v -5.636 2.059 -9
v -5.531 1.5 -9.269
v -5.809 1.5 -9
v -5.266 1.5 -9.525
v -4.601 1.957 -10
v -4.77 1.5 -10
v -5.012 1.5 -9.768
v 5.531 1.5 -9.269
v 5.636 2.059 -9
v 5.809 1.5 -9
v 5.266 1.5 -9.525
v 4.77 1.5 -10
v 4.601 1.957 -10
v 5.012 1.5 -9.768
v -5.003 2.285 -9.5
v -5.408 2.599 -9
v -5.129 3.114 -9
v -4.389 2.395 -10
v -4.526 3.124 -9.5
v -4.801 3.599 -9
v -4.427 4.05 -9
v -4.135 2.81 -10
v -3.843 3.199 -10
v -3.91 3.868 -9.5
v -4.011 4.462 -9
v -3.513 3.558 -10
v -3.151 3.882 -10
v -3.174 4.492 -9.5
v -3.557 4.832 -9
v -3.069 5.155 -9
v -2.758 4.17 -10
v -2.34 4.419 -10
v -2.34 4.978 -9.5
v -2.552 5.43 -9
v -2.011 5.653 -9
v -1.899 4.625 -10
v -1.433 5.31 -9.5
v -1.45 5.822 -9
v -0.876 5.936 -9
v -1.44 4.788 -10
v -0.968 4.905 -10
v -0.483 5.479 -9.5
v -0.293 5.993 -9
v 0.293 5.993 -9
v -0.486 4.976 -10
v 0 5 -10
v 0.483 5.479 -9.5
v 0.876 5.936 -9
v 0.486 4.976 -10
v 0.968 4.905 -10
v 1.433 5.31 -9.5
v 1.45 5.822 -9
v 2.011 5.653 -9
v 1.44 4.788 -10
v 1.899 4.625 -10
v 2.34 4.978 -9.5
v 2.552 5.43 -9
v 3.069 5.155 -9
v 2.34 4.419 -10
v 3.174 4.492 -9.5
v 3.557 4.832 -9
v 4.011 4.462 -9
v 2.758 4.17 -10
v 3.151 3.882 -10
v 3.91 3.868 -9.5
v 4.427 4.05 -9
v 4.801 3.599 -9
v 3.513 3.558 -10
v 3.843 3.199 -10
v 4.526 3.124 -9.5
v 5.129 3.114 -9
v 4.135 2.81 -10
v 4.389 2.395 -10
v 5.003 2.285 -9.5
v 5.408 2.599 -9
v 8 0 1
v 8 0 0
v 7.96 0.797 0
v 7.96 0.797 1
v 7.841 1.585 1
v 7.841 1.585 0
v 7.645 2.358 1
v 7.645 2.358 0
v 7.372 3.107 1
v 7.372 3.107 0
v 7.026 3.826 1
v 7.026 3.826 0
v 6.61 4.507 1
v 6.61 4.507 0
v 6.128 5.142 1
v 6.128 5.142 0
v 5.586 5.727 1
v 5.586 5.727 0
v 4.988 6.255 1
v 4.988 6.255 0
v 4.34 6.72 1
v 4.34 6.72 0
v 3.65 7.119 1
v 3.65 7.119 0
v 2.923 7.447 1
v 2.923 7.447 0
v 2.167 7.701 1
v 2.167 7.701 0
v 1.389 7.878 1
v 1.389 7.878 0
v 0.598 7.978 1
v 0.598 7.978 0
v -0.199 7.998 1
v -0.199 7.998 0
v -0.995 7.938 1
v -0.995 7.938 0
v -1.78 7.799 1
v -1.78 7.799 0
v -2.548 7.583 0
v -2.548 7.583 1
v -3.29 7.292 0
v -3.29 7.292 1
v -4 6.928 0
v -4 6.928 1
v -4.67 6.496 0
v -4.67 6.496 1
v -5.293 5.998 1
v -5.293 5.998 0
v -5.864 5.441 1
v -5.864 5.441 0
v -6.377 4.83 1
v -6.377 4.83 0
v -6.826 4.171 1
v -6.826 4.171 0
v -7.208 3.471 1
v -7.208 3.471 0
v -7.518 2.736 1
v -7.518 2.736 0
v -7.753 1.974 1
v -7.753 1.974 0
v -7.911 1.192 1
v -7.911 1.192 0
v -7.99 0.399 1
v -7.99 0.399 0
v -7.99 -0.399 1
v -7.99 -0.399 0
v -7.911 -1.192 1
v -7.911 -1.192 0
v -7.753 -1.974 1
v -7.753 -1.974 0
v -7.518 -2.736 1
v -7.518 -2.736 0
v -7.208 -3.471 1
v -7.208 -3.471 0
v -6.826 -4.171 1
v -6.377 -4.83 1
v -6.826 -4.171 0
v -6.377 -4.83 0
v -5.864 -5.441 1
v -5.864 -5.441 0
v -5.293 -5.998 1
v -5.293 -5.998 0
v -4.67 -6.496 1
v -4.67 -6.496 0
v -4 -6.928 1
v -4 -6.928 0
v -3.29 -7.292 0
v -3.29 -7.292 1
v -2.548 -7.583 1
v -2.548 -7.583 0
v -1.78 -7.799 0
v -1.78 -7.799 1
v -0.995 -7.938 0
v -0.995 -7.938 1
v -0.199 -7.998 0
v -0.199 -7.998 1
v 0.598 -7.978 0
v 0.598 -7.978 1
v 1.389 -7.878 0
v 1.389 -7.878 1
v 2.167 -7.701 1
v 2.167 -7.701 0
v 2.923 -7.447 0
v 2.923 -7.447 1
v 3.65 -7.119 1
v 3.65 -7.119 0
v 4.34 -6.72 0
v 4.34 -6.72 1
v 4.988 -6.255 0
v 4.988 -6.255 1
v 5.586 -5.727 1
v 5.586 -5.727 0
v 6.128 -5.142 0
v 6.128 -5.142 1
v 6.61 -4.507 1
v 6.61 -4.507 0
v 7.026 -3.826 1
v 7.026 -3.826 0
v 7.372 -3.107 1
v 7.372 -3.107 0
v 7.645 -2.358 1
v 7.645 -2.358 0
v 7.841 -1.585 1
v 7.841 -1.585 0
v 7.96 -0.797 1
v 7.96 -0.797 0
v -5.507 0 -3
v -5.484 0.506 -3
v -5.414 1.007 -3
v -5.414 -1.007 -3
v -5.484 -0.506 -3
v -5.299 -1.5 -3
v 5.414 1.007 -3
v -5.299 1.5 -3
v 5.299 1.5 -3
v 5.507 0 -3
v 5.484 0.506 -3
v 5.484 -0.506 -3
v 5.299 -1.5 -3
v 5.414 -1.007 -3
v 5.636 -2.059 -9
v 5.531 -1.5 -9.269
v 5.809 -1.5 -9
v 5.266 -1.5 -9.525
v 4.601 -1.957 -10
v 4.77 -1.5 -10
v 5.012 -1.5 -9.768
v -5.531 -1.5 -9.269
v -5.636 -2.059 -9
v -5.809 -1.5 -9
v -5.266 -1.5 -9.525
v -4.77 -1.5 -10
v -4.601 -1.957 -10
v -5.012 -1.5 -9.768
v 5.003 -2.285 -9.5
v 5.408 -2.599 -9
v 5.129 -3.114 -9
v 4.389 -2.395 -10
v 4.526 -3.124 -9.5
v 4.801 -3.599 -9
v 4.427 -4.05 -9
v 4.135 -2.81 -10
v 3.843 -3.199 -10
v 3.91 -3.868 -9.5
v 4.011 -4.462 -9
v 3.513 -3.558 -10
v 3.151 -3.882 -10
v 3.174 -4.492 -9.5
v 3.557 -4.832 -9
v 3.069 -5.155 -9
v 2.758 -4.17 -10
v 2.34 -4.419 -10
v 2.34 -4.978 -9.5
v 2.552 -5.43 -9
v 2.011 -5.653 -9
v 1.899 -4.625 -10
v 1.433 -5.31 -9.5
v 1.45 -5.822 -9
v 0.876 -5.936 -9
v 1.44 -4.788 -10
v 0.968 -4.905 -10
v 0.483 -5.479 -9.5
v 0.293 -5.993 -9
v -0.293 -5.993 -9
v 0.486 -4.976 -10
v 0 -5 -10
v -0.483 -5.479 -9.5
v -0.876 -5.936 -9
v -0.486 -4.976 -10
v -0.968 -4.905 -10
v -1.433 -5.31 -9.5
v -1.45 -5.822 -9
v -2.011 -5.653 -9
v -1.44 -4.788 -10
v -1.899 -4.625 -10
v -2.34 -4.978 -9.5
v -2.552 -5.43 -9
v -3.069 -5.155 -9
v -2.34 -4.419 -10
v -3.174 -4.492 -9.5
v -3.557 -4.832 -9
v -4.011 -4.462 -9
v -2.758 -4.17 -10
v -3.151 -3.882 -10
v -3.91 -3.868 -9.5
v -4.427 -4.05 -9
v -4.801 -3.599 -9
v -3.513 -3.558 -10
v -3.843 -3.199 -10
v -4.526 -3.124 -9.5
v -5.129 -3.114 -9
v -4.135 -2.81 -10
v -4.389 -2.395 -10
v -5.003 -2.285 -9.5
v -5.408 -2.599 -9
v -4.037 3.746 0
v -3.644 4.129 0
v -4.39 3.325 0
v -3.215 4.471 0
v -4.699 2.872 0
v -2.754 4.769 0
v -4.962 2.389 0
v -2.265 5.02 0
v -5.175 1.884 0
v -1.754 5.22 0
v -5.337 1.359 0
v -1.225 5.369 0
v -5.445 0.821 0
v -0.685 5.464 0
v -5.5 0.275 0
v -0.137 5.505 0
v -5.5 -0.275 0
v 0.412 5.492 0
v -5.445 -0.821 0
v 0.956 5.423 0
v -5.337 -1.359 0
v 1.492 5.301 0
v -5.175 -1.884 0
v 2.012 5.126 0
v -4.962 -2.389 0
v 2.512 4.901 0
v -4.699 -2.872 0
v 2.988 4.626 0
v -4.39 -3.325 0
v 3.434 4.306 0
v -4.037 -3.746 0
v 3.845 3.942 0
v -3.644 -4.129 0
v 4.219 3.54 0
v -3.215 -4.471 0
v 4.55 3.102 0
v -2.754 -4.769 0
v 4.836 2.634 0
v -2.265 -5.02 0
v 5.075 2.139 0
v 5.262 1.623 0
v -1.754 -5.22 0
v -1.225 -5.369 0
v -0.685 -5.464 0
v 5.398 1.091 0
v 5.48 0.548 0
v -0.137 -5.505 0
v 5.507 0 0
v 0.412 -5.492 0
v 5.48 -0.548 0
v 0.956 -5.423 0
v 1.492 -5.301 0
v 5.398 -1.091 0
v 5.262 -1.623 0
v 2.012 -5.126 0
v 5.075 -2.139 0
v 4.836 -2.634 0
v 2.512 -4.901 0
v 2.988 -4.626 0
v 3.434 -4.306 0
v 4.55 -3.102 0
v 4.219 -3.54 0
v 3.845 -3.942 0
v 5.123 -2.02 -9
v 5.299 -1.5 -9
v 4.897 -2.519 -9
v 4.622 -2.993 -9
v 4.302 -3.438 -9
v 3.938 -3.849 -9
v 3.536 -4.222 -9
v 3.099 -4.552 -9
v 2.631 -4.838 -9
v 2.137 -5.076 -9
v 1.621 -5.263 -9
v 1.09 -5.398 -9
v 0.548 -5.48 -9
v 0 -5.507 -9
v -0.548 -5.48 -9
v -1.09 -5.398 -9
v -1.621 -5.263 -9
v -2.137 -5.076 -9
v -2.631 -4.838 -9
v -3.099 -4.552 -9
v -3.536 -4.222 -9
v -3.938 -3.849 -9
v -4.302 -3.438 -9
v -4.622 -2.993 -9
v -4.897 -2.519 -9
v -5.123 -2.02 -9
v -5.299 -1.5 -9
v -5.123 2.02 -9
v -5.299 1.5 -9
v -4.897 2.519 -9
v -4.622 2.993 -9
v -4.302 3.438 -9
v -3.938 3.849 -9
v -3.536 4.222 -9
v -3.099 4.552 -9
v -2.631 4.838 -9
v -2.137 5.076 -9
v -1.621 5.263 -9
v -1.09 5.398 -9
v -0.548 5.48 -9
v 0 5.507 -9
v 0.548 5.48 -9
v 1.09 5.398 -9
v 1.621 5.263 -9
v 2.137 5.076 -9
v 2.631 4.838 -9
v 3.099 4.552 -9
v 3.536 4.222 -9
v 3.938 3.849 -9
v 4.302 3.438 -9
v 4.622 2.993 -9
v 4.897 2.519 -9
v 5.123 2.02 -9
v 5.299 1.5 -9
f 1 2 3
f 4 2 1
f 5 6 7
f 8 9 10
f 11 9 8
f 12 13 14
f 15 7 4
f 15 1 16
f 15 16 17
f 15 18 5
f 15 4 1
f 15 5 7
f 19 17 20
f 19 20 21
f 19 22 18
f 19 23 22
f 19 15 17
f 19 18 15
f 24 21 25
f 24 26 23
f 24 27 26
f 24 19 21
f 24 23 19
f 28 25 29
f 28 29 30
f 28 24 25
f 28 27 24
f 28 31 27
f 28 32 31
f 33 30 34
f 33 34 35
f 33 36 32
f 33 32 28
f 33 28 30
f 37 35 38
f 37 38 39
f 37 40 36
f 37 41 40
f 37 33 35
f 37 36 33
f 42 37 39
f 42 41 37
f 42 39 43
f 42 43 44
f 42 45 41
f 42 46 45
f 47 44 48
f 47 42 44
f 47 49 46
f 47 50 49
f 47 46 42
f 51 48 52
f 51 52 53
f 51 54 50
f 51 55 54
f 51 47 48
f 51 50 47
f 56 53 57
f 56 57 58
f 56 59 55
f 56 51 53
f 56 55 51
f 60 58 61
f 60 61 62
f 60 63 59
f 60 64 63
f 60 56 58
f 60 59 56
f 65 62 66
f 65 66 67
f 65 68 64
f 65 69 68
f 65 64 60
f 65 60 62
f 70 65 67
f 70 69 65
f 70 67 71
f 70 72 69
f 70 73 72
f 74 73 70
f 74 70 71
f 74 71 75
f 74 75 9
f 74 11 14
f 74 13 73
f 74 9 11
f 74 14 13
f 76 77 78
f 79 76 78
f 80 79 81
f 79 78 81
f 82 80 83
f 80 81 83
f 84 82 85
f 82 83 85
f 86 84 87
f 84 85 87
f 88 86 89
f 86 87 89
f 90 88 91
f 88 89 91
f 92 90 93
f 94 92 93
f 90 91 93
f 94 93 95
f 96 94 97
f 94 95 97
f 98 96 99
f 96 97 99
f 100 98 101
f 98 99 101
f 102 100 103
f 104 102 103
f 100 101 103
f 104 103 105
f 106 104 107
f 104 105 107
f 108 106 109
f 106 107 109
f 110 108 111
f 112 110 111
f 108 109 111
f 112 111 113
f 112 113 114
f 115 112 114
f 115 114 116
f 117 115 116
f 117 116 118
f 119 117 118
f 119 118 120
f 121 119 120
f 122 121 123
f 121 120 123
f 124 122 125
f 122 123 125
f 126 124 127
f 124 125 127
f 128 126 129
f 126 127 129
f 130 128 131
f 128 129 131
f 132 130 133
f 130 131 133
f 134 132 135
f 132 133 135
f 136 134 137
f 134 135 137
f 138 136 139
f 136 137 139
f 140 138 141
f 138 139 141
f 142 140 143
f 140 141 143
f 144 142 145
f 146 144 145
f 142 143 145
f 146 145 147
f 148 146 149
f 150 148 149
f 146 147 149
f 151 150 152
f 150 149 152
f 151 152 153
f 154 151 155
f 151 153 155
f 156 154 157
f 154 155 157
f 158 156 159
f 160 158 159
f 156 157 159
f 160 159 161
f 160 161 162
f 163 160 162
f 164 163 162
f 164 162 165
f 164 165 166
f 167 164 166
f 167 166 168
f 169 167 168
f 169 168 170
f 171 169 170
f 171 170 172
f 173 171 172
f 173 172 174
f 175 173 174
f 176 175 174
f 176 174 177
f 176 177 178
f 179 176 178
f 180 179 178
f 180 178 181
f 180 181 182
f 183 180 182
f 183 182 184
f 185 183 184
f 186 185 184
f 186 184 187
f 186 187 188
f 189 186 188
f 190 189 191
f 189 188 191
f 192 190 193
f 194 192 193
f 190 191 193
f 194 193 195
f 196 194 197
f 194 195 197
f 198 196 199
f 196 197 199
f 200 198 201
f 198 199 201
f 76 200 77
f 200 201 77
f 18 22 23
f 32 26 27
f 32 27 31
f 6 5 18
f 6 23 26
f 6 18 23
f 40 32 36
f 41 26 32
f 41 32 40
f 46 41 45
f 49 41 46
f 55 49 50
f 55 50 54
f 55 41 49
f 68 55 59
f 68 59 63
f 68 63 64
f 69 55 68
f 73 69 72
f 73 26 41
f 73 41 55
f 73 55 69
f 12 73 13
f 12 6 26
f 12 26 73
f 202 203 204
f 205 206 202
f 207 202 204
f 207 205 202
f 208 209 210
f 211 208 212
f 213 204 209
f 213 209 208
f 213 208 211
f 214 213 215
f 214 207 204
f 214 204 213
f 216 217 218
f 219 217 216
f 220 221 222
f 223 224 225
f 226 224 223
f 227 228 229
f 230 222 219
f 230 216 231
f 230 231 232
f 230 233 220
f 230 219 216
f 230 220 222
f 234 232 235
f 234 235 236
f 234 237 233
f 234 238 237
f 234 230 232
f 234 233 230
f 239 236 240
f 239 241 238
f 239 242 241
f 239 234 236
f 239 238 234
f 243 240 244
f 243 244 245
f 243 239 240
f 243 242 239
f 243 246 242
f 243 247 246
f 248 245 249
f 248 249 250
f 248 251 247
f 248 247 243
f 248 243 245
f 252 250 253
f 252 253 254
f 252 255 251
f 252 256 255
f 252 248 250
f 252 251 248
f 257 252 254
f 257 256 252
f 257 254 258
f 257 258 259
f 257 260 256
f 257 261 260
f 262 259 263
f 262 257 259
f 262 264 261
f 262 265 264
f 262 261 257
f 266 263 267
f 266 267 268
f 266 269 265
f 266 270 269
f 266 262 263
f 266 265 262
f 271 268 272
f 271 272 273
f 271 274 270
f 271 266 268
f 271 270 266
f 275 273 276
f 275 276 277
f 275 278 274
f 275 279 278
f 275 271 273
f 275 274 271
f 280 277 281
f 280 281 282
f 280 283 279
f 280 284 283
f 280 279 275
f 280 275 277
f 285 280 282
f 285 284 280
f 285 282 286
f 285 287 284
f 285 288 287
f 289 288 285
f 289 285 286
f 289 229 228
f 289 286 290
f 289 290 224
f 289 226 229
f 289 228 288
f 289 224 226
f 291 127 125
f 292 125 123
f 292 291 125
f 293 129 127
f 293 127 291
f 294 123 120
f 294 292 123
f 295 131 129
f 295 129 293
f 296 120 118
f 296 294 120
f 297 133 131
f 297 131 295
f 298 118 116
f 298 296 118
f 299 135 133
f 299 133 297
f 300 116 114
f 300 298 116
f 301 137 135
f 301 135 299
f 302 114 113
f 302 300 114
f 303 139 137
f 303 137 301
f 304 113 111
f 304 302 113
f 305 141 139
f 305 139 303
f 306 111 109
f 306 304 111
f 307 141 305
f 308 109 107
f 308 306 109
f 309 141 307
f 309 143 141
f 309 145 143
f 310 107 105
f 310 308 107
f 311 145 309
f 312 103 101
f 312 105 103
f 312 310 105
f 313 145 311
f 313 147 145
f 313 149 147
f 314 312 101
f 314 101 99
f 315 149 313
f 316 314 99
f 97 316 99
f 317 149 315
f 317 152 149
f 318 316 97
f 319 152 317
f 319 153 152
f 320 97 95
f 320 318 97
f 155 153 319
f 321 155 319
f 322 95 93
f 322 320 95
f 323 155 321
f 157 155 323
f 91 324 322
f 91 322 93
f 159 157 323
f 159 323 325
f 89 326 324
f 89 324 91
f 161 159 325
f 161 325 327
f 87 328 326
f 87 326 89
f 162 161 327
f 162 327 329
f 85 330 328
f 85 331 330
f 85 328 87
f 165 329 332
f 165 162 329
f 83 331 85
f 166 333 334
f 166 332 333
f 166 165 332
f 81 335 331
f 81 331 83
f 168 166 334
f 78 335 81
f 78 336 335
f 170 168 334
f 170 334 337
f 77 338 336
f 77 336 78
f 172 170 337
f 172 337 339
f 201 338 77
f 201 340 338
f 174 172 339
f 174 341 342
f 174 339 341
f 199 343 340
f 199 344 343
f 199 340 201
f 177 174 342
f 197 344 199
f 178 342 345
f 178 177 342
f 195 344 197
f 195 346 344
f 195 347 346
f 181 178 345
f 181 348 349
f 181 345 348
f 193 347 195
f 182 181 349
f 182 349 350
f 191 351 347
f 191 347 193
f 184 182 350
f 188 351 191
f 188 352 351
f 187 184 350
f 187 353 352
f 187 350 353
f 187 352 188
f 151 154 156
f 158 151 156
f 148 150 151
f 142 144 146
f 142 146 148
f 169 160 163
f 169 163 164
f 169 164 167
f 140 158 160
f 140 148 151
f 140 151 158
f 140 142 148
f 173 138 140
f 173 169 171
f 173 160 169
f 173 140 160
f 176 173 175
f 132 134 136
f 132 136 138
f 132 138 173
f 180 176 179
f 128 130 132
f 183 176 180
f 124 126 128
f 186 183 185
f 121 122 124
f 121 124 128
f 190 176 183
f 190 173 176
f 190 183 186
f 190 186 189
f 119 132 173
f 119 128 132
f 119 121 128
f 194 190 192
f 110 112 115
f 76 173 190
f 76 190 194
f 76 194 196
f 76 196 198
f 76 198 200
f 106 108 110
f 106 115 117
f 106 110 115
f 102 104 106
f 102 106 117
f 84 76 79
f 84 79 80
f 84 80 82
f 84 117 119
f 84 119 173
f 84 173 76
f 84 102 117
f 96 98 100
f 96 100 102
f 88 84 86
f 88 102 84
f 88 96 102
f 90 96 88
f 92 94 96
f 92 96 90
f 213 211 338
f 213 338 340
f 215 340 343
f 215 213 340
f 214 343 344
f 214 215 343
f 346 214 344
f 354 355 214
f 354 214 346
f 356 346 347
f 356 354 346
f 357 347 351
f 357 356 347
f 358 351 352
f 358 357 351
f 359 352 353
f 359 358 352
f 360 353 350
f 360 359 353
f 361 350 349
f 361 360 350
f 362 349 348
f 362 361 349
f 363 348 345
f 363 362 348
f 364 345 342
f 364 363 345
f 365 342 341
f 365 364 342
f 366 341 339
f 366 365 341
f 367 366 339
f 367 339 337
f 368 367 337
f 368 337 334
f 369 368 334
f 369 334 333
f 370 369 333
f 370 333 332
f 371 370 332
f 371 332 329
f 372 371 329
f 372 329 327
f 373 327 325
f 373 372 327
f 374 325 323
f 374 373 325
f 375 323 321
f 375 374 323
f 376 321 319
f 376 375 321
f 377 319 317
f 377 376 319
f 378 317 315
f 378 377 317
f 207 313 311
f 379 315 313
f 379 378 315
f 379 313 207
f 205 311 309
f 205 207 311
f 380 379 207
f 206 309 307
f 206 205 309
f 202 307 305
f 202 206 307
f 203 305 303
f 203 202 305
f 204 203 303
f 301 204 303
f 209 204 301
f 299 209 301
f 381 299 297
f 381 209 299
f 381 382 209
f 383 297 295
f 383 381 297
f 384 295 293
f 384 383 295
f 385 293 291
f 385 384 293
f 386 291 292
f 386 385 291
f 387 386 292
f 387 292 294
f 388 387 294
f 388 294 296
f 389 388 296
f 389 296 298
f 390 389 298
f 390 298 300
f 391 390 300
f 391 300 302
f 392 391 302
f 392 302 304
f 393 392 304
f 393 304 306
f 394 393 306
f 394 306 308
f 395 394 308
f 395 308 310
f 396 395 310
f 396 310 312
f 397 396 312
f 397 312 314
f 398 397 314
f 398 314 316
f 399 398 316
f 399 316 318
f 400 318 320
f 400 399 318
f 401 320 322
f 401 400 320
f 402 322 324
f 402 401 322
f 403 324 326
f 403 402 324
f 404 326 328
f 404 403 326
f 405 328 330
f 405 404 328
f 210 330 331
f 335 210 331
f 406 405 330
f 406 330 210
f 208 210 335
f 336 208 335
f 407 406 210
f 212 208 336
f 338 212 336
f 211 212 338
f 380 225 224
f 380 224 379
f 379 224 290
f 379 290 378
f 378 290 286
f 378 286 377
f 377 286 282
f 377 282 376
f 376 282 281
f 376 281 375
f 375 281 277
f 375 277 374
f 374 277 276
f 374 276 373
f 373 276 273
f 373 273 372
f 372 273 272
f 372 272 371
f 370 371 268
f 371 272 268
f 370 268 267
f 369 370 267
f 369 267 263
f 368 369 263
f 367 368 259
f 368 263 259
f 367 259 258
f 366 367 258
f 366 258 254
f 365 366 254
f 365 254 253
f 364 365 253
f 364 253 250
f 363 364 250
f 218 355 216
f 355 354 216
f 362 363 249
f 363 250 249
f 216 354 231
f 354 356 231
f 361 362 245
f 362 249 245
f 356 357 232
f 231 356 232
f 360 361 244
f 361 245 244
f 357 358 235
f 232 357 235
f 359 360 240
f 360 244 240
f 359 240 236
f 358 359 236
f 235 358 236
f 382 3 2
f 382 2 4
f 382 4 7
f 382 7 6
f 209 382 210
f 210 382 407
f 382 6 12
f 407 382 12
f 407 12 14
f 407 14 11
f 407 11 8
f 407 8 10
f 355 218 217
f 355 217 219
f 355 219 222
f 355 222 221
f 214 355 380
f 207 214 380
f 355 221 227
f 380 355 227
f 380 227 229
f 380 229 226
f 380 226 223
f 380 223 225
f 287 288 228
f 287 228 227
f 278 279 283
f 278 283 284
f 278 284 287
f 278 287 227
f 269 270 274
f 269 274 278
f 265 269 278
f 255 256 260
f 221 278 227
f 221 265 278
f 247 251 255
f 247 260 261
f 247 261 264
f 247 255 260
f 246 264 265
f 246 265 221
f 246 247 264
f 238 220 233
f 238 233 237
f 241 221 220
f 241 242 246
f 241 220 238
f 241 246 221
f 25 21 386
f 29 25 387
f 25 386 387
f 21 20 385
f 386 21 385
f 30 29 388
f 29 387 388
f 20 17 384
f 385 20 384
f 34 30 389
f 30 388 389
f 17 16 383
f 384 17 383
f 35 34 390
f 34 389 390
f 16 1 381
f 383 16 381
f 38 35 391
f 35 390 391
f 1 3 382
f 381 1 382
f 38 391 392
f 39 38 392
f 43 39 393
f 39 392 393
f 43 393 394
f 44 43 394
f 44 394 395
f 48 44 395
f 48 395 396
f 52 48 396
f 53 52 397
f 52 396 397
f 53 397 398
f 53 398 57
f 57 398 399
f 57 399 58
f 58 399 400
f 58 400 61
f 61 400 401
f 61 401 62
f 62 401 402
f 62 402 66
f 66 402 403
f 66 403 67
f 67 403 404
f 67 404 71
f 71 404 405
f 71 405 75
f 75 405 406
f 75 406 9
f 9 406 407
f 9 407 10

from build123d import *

# Parameters (mm, degrees)
F0_R     = 8
F1_DEPTH = 1
F2_R     = 6
F3_DEPTH = 10
F5_DEPTH = 7
F6_SIZE  = 1
F8_R     = 6
F8_R_2   = 5.5070026954
F9_DEPTH = 9


with BuildPart() as f1:
    # F0 (on Top) → F1 (new body)
    with BuildSketch(Plane.XY):
        Circle(F0_R)
    extrude(amount=F1_DEPTH)

    # F2 (on face) → F3 (join)
    with BuildSketch(Plane(origin=(0, 0, 0), x_dir=(1, 0, 0), z_dir=(0, 0, -1))):
        Circle(F2_R)
    extrude(amount=F3_DEPTH)

    # F4 (on face) → F5 (cut)
    with BuildSketch(Plane(origin=(0, 0, -10), x_dir=(1, 0, 0), z_dir=(0, 0, -1))):
        with BuildLine():
            ThreePointArc((5.8094750193, -1.5), (5.9521781776, -0.7560257549), (6, 0))
            ThreePointArc((6, 0), (5.9521781776, 0.7560257549), (5.8094750193, 1.5))
            Line((5.8094750193, 1.5), (-5.8094750193, 1.5))
            ThreePointArc((-5.8094750193, 1.5), (-6, 0), (-5.8094750193, -1.5))
            Line((-5.8094750193, -1.5), (5.8094750193, -1.5))
        make_face()
    extrude(amount=-F5_DEPTH, mode=Mode.SUBTRACT)

    # F6
    f6_edges = [f1.edges().sort_by_distance(p)[0] for p in [
        (0, 6, -10),
        (0, -6, -10),
    ]]
    chamfer(f6_edges, length=F6_SIZE)

    # F8 (on offset) → F9 (cut)
    with BuildSketch(Plane(origin=(0, 0, -9), x_dir=(1, 0, 0), z_dir=(0, 0, -1))):
        Circle(F8_R)
        Circle(F8_R_2, mode=Mode.SUBTRACT)
    extrude(amount=-F9_DEPTH, mode=Mode.SUBTRACT)


solid = f1.part
